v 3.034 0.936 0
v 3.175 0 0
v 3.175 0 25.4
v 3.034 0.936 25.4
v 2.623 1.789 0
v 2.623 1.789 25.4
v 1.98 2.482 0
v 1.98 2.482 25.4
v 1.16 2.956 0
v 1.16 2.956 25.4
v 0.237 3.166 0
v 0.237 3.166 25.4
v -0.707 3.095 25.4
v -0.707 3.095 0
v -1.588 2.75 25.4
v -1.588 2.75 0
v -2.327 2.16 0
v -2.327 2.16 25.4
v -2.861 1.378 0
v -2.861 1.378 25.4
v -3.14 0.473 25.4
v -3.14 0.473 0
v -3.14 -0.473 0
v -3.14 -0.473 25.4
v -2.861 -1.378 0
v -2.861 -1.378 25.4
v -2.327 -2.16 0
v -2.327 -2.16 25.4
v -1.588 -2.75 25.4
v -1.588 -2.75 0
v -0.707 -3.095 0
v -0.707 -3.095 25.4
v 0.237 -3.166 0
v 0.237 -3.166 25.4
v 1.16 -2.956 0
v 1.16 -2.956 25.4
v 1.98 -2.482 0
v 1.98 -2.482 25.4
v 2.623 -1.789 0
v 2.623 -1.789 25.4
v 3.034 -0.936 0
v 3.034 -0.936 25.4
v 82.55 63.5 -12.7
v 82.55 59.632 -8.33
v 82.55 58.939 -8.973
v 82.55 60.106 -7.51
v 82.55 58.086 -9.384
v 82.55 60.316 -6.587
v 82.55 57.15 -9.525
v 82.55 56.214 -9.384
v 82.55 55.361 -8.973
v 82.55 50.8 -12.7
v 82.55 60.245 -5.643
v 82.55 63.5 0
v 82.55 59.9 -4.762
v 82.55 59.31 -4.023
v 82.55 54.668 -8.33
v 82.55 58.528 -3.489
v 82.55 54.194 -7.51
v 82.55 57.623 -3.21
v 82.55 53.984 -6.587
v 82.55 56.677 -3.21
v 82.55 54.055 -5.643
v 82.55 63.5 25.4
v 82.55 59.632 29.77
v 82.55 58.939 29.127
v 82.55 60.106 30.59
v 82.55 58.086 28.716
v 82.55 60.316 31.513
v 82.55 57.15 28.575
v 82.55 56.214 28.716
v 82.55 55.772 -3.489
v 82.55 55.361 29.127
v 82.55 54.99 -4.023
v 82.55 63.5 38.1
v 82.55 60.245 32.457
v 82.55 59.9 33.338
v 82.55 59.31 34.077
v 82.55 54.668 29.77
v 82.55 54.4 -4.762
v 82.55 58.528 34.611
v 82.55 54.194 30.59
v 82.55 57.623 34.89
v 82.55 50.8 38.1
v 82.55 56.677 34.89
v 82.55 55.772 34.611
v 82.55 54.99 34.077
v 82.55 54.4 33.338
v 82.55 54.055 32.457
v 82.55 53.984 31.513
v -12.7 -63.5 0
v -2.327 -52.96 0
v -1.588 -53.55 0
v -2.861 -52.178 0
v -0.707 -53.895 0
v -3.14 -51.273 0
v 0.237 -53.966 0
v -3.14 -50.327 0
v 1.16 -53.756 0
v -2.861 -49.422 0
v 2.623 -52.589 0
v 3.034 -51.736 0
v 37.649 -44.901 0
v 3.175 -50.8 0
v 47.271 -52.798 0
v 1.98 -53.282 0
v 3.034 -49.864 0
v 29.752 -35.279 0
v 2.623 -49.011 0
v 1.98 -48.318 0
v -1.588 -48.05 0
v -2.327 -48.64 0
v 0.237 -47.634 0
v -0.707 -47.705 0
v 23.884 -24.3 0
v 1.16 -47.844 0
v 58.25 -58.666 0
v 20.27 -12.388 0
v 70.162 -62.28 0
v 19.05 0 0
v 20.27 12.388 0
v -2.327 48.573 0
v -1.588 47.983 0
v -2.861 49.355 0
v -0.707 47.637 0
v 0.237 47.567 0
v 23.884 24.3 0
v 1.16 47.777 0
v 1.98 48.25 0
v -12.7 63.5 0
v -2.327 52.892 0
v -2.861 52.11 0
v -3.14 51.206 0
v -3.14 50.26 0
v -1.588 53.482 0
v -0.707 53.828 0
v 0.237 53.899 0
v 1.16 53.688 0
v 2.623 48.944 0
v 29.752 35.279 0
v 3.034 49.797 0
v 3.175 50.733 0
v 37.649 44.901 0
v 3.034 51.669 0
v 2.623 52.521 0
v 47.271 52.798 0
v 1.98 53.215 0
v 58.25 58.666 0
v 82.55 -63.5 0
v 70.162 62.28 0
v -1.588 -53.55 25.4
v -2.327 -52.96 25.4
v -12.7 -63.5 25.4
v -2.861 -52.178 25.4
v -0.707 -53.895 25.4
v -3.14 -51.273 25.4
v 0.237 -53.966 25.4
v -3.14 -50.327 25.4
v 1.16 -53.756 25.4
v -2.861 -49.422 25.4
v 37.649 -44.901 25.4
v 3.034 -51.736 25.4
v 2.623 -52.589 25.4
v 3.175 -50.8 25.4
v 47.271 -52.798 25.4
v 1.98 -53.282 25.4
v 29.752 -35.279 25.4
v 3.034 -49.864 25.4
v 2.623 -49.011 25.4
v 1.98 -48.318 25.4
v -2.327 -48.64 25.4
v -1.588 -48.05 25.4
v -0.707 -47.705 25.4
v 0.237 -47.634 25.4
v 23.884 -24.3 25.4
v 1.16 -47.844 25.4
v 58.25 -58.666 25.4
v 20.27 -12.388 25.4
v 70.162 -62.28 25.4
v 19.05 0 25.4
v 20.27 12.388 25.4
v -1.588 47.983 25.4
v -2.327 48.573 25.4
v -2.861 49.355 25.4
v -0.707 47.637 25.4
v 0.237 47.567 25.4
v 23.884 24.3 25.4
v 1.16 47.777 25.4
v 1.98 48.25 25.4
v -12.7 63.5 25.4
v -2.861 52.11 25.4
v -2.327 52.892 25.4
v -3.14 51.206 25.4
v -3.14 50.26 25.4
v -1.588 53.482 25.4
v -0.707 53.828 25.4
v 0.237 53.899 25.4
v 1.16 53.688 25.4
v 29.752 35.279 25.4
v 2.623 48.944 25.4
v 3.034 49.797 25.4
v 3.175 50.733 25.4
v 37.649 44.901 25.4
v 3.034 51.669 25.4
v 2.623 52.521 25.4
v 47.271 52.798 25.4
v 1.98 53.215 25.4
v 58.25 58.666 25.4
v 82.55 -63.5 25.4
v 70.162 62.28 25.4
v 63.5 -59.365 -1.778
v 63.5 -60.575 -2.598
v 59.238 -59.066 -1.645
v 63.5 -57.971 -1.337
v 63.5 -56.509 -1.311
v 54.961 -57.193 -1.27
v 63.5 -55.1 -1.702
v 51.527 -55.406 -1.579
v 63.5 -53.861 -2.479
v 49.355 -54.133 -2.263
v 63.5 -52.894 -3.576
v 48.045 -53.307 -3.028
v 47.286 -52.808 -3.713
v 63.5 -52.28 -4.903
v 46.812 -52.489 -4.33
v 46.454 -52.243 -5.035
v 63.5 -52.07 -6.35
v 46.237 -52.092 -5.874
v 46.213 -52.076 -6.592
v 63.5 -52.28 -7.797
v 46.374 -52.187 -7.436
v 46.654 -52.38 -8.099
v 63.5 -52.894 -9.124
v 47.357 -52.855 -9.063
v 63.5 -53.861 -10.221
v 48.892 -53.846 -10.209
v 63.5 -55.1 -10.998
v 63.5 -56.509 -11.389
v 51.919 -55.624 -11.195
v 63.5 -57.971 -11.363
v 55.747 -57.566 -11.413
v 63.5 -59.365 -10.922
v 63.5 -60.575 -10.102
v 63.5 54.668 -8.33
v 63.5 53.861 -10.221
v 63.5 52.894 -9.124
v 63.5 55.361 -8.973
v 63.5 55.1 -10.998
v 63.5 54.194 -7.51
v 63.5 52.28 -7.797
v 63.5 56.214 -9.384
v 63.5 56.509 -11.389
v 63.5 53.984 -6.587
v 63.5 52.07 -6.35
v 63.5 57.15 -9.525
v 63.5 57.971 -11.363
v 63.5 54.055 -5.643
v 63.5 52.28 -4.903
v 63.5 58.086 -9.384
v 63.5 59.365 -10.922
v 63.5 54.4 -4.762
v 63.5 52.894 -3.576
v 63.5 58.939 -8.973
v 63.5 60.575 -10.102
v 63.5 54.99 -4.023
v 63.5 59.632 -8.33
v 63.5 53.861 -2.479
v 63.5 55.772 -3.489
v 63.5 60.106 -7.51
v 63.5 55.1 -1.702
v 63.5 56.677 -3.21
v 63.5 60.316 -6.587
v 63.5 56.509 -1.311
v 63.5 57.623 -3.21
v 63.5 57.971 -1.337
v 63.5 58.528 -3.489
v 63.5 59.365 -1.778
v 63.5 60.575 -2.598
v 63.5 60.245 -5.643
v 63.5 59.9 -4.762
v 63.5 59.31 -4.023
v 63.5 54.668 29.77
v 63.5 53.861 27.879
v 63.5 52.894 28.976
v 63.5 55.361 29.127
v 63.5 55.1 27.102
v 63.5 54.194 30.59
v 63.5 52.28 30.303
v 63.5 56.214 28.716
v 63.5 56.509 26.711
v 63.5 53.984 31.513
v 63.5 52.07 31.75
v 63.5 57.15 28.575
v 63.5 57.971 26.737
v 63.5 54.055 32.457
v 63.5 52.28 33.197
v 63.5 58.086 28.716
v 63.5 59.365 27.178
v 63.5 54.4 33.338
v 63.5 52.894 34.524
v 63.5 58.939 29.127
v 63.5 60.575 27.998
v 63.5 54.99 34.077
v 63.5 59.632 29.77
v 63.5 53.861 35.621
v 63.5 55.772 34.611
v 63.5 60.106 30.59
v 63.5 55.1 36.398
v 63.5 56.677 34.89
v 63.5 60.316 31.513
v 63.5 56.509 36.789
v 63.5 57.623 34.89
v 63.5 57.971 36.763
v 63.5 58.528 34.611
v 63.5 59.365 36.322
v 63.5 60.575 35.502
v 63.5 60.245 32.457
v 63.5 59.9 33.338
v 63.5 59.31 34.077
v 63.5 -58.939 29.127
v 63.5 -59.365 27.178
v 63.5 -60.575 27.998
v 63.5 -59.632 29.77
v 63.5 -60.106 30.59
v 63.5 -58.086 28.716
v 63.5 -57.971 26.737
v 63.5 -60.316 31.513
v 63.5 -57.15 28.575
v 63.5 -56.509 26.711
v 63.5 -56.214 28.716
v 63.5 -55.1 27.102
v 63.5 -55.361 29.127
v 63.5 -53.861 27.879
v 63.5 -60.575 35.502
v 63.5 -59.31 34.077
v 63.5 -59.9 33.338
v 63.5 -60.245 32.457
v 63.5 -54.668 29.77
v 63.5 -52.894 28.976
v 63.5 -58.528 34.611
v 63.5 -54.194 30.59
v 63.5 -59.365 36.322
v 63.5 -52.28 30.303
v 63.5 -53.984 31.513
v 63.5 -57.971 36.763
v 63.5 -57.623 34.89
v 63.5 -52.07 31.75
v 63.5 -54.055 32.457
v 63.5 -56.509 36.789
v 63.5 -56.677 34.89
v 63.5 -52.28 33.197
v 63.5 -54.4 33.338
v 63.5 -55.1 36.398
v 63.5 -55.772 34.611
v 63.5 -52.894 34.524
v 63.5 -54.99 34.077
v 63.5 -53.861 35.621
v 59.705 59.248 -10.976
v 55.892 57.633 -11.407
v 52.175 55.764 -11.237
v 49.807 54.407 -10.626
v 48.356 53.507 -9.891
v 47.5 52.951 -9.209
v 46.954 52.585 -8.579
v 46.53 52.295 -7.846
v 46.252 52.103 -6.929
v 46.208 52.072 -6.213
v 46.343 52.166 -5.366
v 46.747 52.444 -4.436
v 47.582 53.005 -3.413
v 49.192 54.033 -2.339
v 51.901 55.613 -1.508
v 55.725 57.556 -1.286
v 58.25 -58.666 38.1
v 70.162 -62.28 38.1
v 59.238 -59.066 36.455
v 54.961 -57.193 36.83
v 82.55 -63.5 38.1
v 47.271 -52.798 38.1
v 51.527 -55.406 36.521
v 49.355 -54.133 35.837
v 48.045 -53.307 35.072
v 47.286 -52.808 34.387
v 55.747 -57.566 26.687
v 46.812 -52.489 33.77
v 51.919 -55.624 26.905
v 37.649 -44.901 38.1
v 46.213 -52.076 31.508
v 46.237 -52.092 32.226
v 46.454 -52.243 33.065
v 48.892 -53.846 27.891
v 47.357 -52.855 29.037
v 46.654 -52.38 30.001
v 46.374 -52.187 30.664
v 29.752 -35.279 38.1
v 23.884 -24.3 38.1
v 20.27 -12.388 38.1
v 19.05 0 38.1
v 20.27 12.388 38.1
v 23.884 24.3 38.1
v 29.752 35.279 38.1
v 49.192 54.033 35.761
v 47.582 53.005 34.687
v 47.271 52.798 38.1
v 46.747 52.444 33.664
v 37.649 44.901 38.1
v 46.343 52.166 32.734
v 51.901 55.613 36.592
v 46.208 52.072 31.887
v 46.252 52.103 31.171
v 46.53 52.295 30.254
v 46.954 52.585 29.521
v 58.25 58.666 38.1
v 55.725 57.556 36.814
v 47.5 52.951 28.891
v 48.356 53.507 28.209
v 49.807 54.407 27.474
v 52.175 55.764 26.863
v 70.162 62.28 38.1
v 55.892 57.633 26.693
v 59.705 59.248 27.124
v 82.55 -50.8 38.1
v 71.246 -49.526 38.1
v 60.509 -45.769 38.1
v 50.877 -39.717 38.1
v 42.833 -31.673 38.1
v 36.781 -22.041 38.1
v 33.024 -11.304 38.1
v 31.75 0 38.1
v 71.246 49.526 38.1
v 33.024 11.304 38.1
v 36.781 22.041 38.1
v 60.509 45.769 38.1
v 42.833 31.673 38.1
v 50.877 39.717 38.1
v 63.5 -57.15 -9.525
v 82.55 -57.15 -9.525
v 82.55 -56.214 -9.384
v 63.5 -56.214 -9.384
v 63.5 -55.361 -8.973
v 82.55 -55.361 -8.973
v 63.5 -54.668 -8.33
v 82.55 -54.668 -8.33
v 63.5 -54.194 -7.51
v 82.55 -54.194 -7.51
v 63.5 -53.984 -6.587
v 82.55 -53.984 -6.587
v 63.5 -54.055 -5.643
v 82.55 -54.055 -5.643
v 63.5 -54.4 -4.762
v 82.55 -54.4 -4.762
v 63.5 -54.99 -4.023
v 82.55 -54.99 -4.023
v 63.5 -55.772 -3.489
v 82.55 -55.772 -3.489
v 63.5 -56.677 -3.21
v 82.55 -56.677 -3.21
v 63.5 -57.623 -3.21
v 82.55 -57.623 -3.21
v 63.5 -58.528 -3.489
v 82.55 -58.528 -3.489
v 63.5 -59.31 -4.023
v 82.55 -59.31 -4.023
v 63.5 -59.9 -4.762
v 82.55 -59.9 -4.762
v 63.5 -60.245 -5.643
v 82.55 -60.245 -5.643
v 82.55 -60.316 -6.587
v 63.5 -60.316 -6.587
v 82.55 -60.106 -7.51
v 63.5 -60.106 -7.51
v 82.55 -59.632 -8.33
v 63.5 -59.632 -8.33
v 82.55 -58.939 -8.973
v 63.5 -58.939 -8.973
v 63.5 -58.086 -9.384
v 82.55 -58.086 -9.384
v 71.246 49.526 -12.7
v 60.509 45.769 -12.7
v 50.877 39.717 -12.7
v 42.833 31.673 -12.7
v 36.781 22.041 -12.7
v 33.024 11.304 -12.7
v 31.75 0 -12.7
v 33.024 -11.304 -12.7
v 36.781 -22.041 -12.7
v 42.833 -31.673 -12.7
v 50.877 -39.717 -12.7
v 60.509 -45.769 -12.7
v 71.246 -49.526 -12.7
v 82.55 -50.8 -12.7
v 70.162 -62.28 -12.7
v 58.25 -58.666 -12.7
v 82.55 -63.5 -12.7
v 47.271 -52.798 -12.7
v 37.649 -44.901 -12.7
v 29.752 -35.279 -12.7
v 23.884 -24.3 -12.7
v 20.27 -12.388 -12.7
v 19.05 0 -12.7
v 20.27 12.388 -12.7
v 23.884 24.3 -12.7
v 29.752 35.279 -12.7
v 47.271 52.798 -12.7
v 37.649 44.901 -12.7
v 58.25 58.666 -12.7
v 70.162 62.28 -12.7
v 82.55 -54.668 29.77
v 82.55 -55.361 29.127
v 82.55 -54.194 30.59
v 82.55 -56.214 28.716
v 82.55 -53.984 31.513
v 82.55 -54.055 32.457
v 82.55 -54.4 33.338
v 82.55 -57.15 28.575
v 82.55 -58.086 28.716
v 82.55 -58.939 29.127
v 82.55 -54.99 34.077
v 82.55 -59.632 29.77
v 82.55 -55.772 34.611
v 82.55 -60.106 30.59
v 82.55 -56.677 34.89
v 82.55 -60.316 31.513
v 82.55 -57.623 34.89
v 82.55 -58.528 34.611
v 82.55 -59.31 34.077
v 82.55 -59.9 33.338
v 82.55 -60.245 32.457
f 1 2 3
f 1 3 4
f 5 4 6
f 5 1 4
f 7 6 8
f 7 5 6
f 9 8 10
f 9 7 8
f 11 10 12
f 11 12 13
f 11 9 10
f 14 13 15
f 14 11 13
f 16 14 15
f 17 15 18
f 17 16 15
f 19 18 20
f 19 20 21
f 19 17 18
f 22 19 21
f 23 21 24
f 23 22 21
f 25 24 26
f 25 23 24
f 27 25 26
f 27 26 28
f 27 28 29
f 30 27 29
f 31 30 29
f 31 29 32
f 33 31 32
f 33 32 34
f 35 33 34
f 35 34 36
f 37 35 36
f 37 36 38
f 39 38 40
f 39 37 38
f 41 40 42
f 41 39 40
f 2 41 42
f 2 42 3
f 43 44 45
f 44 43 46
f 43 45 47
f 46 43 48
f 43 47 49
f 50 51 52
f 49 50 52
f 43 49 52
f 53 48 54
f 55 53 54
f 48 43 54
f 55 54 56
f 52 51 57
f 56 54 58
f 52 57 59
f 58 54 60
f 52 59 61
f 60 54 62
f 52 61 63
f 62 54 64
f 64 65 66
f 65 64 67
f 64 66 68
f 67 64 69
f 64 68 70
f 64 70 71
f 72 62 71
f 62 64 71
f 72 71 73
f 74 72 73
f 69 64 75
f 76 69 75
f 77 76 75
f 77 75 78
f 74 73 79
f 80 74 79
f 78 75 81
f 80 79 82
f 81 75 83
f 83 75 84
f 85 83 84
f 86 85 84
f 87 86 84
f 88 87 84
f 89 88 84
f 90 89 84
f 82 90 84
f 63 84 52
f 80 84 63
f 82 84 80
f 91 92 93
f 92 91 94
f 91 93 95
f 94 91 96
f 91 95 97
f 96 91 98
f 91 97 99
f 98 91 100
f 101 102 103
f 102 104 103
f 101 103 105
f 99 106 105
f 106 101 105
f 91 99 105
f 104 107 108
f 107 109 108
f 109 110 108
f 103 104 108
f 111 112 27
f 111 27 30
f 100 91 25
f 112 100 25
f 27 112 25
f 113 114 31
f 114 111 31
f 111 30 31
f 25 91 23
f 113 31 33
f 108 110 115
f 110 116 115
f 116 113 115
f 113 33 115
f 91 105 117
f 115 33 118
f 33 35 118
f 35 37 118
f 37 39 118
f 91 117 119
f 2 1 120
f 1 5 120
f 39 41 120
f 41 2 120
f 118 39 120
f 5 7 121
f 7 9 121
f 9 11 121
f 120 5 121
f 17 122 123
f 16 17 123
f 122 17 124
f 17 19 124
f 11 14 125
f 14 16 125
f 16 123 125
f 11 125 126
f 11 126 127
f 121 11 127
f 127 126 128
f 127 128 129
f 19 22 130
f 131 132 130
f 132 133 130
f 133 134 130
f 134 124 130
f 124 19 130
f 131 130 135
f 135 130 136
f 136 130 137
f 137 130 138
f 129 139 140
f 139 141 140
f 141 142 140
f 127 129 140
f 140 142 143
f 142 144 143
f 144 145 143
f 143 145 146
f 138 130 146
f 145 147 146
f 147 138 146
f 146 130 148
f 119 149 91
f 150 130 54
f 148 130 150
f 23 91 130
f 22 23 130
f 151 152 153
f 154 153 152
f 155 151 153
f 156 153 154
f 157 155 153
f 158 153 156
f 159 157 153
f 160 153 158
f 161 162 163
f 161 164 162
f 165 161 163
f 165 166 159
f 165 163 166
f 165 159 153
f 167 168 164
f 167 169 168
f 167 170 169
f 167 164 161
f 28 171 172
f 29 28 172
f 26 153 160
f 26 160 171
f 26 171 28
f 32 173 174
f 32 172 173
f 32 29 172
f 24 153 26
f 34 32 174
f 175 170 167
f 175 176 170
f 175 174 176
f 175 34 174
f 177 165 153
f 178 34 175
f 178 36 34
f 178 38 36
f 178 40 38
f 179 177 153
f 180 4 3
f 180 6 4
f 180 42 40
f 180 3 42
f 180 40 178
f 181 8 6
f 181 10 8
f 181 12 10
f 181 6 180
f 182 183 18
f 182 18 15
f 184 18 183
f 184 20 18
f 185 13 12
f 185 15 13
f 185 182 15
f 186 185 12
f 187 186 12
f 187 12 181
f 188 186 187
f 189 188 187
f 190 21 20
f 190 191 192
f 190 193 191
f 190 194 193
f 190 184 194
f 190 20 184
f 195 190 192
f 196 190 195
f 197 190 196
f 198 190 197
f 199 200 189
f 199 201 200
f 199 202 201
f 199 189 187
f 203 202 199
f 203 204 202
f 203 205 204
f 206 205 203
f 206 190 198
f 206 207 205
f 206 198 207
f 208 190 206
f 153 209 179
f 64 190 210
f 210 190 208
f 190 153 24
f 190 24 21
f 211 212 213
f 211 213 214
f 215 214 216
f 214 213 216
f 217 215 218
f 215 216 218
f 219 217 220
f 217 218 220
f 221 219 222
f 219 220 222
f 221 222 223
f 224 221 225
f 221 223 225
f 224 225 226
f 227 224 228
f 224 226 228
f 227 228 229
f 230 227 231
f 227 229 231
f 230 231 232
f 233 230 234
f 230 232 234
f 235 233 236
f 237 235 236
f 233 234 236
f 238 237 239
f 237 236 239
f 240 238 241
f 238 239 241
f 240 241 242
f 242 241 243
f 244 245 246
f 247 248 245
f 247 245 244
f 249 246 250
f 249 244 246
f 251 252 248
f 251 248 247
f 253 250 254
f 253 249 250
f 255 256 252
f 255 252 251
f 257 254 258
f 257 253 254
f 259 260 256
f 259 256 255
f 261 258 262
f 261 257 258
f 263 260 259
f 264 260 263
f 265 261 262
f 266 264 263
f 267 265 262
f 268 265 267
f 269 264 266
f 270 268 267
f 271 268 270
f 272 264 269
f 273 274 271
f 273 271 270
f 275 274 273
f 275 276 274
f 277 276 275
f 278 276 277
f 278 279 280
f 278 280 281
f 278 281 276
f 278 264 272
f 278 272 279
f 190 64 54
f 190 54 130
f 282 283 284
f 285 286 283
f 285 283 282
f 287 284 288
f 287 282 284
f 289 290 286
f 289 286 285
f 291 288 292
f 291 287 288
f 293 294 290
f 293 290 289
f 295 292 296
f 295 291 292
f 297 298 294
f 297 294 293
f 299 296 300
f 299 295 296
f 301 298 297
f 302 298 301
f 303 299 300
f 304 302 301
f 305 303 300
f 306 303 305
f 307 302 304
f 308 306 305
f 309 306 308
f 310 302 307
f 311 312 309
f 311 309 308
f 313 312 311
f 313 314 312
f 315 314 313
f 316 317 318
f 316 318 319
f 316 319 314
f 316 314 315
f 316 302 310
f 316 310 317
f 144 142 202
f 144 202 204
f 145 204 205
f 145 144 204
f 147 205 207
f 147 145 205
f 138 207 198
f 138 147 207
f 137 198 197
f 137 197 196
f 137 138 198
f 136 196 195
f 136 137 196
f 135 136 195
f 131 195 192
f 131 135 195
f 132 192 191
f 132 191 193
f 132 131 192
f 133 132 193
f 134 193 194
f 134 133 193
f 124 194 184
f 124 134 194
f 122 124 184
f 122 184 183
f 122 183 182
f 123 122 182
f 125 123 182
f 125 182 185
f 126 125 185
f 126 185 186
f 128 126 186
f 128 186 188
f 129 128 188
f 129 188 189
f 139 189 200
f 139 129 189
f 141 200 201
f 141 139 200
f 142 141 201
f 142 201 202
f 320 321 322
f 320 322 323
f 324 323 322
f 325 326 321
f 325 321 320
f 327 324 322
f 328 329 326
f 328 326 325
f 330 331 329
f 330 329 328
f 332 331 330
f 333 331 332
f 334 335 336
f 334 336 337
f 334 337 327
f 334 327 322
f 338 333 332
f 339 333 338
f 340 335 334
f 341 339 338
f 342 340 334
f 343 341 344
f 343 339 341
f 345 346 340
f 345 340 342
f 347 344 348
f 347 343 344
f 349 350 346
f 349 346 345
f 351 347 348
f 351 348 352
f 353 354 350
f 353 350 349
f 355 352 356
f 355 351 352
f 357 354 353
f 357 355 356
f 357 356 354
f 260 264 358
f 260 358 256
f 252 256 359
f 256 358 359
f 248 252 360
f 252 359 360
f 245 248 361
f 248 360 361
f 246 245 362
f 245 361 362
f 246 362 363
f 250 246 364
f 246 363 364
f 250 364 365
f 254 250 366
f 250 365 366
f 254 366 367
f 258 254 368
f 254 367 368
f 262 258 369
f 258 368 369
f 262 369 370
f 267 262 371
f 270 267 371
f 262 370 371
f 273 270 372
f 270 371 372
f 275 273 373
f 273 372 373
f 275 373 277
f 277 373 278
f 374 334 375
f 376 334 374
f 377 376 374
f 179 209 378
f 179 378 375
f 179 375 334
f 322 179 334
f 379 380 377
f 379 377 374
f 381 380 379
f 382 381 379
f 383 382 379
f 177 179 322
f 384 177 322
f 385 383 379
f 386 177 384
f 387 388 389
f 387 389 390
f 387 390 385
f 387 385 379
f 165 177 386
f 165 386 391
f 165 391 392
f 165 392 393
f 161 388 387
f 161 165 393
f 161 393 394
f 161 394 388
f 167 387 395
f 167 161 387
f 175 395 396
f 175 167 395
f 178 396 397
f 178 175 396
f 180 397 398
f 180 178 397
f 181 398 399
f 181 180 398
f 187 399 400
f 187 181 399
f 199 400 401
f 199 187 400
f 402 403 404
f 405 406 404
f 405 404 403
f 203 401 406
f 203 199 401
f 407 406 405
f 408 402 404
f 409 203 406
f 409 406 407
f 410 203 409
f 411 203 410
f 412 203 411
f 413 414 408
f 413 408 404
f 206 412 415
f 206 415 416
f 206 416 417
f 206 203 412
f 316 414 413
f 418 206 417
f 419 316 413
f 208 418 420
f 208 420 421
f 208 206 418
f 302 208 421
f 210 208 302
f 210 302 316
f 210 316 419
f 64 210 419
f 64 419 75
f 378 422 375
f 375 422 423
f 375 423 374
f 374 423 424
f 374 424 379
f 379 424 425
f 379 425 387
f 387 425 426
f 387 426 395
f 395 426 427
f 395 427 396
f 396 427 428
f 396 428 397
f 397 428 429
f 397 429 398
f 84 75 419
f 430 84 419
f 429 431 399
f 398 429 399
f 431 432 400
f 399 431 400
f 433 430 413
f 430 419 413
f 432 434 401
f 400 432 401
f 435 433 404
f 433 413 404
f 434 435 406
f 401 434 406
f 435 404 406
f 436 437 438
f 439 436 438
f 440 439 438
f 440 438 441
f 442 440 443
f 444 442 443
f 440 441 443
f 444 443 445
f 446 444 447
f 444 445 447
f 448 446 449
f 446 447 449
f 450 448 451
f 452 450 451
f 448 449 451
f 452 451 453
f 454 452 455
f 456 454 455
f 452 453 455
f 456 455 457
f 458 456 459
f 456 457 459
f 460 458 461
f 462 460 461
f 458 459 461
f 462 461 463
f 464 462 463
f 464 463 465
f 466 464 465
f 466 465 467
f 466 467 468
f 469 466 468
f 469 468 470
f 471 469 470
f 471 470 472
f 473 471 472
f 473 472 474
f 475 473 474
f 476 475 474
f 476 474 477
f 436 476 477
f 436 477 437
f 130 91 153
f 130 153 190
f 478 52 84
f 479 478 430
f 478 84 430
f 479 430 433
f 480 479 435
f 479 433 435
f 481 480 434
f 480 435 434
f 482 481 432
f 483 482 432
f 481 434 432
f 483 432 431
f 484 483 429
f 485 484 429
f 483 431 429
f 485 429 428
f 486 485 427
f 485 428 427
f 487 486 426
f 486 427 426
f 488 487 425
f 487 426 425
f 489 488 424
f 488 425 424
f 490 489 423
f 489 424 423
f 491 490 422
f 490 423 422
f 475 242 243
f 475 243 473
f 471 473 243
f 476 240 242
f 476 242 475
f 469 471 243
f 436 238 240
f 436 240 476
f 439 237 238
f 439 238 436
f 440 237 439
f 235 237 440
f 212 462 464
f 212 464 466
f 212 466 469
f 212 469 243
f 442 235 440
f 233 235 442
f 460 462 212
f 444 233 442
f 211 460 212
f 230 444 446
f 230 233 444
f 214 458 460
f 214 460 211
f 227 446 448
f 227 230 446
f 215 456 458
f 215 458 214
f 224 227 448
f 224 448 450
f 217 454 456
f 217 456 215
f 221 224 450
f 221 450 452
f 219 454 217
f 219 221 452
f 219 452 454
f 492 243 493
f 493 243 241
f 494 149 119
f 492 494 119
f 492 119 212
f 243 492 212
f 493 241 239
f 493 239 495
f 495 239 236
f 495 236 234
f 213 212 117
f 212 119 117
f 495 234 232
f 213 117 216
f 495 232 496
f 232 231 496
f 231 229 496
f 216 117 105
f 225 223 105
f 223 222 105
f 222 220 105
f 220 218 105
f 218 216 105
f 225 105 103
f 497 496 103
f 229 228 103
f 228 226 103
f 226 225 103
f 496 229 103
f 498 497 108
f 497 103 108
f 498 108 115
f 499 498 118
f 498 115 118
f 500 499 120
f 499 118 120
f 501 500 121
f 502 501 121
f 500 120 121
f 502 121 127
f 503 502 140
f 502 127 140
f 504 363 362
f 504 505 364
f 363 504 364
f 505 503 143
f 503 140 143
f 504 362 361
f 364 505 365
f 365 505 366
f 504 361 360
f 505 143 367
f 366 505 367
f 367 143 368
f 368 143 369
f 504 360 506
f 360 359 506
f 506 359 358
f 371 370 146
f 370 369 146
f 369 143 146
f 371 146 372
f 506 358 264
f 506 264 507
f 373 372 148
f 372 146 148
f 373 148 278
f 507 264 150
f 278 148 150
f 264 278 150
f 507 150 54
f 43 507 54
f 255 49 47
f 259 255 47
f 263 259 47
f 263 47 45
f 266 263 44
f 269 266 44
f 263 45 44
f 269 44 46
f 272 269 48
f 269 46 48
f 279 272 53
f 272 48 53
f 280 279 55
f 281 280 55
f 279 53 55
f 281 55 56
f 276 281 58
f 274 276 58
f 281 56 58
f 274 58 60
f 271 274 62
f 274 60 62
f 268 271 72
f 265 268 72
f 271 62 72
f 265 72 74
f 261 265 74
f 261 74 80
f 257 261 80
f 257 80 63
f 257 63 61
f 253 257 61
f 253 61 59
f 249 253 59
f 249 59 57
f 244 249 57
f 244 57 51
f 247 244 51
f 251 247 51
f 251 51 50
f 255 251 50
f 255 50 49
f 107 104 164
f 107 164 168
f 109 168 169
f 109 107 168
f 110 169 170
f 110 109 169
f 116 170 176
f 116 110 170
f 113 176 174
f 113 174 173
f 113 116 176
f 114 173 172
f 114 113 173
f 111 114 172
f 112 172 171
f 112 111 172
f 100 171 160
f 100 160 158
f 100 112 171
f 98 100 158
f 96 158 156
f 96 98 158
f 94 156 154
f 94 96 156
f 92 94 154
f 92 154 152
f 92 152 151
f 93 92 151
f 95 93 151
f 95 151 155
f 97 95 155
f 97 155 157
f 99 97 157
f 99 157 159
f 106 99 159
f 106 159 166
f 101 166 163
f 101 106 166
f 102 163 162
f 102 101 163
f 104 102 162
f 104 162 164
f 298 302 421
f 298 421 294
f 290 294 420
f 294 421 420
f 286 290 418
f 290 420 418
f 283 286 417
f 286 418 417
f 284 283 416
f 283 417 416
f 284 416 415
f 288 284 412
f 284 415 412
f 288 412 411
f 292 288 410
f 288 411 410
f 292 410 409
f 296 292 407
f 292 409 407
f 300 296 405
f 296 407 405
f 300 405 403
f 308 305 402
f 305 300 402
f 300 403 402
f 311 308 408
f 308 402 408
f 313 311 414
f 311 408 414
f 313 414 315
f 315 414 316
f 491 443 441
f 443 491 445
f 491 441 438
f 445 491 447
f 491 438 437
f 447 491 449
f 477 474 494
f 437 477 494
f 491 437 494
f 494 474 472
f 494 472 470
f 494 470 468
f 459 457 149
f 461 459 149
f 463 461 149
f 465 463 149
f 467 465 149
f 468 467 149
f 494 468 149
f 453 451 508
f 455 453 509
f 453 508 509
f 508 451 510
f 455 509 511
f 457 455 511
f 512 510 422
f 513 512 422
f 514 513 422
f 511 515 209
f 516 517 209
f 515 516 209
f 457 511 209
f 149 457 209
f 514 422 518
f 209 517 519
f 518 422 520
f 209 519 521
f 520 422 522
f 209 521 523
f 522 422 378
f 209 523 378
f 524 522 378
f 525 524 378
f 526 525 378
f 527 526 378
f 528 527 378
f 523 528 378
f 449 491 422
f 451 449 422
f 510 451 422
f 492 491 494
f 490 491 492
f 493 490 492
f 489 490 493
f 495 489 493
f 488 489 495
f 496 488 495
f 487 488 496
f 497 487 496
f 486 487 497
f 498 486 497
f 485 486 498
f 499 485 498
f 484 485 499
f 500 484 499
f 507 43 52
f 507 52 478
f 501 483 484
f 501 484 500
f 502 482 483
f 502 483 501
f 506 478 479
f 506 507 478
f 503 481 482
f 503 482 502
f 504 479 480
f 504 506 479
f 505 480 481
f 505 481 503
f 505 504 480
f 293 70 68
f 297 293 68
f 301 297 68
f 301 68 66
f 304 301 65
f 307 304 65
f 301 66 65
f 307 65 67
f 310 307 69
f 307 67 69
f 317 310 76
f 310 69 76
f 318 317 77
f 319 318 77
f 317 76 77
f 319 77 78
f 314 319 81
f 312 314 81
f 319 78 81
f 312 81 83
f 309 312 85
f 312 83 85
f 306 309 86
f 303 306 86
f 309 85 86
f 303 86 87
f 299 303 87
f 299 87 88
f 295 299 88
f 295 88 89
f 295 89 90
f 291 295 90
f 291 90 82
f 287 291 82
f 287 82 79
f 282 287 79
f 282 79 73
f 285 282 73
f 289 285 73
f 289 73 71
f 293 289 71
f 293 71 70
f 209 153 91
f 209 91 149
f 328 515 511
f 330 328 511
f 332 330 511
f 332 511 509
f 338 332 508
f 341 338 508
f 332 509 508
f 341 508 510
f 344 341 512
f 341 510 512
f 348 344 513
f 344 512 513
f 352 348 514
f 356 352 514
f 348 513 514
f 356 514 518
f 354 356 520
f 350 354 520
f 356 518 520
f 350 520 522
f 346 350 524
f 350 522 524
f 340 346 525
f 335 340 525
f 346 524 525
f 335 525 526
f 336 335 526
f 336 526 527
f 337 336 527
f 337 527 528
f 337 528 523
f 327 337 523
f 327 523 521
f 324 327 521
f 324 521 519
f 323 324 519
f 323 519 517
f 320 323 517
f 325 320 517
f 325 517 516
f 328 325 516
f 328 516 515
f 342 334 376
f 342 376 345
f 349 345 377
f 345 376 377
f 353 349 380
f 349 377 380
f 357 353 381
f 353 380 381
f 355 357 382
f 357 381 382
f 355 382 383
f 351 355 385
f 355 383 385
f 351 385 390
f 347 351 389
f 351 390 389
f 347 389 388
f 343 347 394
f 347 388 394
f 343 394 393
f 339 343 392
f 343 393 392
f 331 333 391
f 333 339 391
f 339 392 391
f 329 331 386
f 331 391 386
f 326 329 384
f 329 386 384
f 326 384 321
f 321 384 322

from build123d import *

# Parameters (mm, degrees)
SKETCH1_W           = 25.4
SKETCH1_H           = 127
SKETCH1_R           = 3.175
BOSS_EXTRUDE1_DEPTH = 25.4
BOSS_EXTRUDE2_DEPTH = 25.4
BOSS_EXTRUDE3_DEPTH = 12.7
BOSS_EXTRUDE4_DEPTH = 12.7
SKETCH5_R           = 3.175
CUT_EXTRUDE1_DEPTH  = 96.25
SKETCH6_R           = 5.08
CUT_EXTRUDE2_DEPTH  = 76.2


with BuildPart() as part:
    # Sketch1 → Boss-Extrude1 (new body)
    with BuildSketch(Plane.XY):
        Rectangle(SKETCH1_W, SKETCH1_H)
        with Locations((0, 50.732762061)):
            Circle(SKETCH1_R, mode=Mode.SUBTRACT)
        Circle(SKETCH1_R, mode=Mode.SUBTRACT)
        with Locations((0, -50.8)):
            Circle(SKETCH1_R, mode=Mode.SUBTRACT)
    extrude(amount=BOSS_EXTRUDE1_DEPTH)

    # Sketch2 → Boss-Extrude2 (add)
    with BuildSketch(Plane.XY.offset(25.4)):
        with BuildLine():
            Line((12.7, 63.5), (12.7, -63.5))
            Line((12.7, -63.5), (82.55, -63.5))
            Line((82.55, -63.5), (82.55, -50.8))
            ThreePointArc((82.55, -50.8), (31.75, 0), (82.55, 50.8))
            Line((82.55, 50.8), (82.55, 63.5))
            Line((82.55, 63.5), (12.7, 63.5))
        make_face()
    extrude(amount=-BOSS_EXTRUDE2_DEPTH)

    # Sketch3 → Boss-Extrude3 (add)
    with BuildSketch(Plane.XY.offset(25.4)):
        with BuildLine():
            Line((82.55, 63.5), (82.55, 50.8))
            ThreePointArc((82.55, 50.8), (31.75, 0), (82.55, -50.8))
            Line((82.55, -50.8), (82.55, -63.5))
            ThreePointArc((82.55, -63.5), (19.05, 0), (82.55, 63.5))
        make_face()
    extrude(amount=BOSS_EXTRUDE3_DEPTH)

    # Sketch4 → Boss-Extrude4 (add)
    with BuildSketch(Plane(origin=(0, 0, 0), x_dir=(-1, 0, 0), z_dir=(0, 0, -1))):
        with BuildLine():
            Line((-82.55, 63.5), (-82.55, 50.8))
            ThreePointArc((-82.55, 50.8), (-31.75, 0), (-82.55, -50.8))
            Line((-82.55, -50.8), (-82.55, -63.5))
            ThreePointArc((-82.55, -63.5), (-19.05, 0), (-82.55, 63.5))
        make_face()
    extrude(amount=BOSS_EXTRUDE4_DEPTH)

    # Sketch5 → Cut-Extrude1 (cut, through all)
    with BuildSketch(Plane(origin=(82.55, 0, 0), x_dir=(0, 0, -1), z_dir=(1, 0, 0))):
        with Locations((-31.75, 57.15)):
            Circle(SKETCH5_R)
        with Locations((6.35, 57.15)):
            Circle(SKETCH5_R)
        with Locations((6.35, -57.15)):
            Circle(SKETCH5_R)
        with Locations((-31.75, -57.15)):
            Circle(SKETCH5_R)
    extrude(amount=-CUT_EXTRUDE1_DEPTH, mode=Mode.SUBTRACT)

    # Sketch6 → Cut-Extrude2 (cut)
    with BuildSketch(Plane.ZY.offset(12.7)):
        with Locations((-6.35, 57.15)):
            Circle(SKETCH6_R)
        with Locations((31.75, 57.15)):
            Circle(SKETCH6_R)
        with Locations((31.75, -57.15)):
            Circle(SKETCH6_R)
        with Locations((-6.35, -57.15)):
            Circle(SKETCH6_R)
    extrude(amount=-CUT_EXTRUDE2_DEPTH, mode=Mode.SUBTRACT)


solid = part.part
